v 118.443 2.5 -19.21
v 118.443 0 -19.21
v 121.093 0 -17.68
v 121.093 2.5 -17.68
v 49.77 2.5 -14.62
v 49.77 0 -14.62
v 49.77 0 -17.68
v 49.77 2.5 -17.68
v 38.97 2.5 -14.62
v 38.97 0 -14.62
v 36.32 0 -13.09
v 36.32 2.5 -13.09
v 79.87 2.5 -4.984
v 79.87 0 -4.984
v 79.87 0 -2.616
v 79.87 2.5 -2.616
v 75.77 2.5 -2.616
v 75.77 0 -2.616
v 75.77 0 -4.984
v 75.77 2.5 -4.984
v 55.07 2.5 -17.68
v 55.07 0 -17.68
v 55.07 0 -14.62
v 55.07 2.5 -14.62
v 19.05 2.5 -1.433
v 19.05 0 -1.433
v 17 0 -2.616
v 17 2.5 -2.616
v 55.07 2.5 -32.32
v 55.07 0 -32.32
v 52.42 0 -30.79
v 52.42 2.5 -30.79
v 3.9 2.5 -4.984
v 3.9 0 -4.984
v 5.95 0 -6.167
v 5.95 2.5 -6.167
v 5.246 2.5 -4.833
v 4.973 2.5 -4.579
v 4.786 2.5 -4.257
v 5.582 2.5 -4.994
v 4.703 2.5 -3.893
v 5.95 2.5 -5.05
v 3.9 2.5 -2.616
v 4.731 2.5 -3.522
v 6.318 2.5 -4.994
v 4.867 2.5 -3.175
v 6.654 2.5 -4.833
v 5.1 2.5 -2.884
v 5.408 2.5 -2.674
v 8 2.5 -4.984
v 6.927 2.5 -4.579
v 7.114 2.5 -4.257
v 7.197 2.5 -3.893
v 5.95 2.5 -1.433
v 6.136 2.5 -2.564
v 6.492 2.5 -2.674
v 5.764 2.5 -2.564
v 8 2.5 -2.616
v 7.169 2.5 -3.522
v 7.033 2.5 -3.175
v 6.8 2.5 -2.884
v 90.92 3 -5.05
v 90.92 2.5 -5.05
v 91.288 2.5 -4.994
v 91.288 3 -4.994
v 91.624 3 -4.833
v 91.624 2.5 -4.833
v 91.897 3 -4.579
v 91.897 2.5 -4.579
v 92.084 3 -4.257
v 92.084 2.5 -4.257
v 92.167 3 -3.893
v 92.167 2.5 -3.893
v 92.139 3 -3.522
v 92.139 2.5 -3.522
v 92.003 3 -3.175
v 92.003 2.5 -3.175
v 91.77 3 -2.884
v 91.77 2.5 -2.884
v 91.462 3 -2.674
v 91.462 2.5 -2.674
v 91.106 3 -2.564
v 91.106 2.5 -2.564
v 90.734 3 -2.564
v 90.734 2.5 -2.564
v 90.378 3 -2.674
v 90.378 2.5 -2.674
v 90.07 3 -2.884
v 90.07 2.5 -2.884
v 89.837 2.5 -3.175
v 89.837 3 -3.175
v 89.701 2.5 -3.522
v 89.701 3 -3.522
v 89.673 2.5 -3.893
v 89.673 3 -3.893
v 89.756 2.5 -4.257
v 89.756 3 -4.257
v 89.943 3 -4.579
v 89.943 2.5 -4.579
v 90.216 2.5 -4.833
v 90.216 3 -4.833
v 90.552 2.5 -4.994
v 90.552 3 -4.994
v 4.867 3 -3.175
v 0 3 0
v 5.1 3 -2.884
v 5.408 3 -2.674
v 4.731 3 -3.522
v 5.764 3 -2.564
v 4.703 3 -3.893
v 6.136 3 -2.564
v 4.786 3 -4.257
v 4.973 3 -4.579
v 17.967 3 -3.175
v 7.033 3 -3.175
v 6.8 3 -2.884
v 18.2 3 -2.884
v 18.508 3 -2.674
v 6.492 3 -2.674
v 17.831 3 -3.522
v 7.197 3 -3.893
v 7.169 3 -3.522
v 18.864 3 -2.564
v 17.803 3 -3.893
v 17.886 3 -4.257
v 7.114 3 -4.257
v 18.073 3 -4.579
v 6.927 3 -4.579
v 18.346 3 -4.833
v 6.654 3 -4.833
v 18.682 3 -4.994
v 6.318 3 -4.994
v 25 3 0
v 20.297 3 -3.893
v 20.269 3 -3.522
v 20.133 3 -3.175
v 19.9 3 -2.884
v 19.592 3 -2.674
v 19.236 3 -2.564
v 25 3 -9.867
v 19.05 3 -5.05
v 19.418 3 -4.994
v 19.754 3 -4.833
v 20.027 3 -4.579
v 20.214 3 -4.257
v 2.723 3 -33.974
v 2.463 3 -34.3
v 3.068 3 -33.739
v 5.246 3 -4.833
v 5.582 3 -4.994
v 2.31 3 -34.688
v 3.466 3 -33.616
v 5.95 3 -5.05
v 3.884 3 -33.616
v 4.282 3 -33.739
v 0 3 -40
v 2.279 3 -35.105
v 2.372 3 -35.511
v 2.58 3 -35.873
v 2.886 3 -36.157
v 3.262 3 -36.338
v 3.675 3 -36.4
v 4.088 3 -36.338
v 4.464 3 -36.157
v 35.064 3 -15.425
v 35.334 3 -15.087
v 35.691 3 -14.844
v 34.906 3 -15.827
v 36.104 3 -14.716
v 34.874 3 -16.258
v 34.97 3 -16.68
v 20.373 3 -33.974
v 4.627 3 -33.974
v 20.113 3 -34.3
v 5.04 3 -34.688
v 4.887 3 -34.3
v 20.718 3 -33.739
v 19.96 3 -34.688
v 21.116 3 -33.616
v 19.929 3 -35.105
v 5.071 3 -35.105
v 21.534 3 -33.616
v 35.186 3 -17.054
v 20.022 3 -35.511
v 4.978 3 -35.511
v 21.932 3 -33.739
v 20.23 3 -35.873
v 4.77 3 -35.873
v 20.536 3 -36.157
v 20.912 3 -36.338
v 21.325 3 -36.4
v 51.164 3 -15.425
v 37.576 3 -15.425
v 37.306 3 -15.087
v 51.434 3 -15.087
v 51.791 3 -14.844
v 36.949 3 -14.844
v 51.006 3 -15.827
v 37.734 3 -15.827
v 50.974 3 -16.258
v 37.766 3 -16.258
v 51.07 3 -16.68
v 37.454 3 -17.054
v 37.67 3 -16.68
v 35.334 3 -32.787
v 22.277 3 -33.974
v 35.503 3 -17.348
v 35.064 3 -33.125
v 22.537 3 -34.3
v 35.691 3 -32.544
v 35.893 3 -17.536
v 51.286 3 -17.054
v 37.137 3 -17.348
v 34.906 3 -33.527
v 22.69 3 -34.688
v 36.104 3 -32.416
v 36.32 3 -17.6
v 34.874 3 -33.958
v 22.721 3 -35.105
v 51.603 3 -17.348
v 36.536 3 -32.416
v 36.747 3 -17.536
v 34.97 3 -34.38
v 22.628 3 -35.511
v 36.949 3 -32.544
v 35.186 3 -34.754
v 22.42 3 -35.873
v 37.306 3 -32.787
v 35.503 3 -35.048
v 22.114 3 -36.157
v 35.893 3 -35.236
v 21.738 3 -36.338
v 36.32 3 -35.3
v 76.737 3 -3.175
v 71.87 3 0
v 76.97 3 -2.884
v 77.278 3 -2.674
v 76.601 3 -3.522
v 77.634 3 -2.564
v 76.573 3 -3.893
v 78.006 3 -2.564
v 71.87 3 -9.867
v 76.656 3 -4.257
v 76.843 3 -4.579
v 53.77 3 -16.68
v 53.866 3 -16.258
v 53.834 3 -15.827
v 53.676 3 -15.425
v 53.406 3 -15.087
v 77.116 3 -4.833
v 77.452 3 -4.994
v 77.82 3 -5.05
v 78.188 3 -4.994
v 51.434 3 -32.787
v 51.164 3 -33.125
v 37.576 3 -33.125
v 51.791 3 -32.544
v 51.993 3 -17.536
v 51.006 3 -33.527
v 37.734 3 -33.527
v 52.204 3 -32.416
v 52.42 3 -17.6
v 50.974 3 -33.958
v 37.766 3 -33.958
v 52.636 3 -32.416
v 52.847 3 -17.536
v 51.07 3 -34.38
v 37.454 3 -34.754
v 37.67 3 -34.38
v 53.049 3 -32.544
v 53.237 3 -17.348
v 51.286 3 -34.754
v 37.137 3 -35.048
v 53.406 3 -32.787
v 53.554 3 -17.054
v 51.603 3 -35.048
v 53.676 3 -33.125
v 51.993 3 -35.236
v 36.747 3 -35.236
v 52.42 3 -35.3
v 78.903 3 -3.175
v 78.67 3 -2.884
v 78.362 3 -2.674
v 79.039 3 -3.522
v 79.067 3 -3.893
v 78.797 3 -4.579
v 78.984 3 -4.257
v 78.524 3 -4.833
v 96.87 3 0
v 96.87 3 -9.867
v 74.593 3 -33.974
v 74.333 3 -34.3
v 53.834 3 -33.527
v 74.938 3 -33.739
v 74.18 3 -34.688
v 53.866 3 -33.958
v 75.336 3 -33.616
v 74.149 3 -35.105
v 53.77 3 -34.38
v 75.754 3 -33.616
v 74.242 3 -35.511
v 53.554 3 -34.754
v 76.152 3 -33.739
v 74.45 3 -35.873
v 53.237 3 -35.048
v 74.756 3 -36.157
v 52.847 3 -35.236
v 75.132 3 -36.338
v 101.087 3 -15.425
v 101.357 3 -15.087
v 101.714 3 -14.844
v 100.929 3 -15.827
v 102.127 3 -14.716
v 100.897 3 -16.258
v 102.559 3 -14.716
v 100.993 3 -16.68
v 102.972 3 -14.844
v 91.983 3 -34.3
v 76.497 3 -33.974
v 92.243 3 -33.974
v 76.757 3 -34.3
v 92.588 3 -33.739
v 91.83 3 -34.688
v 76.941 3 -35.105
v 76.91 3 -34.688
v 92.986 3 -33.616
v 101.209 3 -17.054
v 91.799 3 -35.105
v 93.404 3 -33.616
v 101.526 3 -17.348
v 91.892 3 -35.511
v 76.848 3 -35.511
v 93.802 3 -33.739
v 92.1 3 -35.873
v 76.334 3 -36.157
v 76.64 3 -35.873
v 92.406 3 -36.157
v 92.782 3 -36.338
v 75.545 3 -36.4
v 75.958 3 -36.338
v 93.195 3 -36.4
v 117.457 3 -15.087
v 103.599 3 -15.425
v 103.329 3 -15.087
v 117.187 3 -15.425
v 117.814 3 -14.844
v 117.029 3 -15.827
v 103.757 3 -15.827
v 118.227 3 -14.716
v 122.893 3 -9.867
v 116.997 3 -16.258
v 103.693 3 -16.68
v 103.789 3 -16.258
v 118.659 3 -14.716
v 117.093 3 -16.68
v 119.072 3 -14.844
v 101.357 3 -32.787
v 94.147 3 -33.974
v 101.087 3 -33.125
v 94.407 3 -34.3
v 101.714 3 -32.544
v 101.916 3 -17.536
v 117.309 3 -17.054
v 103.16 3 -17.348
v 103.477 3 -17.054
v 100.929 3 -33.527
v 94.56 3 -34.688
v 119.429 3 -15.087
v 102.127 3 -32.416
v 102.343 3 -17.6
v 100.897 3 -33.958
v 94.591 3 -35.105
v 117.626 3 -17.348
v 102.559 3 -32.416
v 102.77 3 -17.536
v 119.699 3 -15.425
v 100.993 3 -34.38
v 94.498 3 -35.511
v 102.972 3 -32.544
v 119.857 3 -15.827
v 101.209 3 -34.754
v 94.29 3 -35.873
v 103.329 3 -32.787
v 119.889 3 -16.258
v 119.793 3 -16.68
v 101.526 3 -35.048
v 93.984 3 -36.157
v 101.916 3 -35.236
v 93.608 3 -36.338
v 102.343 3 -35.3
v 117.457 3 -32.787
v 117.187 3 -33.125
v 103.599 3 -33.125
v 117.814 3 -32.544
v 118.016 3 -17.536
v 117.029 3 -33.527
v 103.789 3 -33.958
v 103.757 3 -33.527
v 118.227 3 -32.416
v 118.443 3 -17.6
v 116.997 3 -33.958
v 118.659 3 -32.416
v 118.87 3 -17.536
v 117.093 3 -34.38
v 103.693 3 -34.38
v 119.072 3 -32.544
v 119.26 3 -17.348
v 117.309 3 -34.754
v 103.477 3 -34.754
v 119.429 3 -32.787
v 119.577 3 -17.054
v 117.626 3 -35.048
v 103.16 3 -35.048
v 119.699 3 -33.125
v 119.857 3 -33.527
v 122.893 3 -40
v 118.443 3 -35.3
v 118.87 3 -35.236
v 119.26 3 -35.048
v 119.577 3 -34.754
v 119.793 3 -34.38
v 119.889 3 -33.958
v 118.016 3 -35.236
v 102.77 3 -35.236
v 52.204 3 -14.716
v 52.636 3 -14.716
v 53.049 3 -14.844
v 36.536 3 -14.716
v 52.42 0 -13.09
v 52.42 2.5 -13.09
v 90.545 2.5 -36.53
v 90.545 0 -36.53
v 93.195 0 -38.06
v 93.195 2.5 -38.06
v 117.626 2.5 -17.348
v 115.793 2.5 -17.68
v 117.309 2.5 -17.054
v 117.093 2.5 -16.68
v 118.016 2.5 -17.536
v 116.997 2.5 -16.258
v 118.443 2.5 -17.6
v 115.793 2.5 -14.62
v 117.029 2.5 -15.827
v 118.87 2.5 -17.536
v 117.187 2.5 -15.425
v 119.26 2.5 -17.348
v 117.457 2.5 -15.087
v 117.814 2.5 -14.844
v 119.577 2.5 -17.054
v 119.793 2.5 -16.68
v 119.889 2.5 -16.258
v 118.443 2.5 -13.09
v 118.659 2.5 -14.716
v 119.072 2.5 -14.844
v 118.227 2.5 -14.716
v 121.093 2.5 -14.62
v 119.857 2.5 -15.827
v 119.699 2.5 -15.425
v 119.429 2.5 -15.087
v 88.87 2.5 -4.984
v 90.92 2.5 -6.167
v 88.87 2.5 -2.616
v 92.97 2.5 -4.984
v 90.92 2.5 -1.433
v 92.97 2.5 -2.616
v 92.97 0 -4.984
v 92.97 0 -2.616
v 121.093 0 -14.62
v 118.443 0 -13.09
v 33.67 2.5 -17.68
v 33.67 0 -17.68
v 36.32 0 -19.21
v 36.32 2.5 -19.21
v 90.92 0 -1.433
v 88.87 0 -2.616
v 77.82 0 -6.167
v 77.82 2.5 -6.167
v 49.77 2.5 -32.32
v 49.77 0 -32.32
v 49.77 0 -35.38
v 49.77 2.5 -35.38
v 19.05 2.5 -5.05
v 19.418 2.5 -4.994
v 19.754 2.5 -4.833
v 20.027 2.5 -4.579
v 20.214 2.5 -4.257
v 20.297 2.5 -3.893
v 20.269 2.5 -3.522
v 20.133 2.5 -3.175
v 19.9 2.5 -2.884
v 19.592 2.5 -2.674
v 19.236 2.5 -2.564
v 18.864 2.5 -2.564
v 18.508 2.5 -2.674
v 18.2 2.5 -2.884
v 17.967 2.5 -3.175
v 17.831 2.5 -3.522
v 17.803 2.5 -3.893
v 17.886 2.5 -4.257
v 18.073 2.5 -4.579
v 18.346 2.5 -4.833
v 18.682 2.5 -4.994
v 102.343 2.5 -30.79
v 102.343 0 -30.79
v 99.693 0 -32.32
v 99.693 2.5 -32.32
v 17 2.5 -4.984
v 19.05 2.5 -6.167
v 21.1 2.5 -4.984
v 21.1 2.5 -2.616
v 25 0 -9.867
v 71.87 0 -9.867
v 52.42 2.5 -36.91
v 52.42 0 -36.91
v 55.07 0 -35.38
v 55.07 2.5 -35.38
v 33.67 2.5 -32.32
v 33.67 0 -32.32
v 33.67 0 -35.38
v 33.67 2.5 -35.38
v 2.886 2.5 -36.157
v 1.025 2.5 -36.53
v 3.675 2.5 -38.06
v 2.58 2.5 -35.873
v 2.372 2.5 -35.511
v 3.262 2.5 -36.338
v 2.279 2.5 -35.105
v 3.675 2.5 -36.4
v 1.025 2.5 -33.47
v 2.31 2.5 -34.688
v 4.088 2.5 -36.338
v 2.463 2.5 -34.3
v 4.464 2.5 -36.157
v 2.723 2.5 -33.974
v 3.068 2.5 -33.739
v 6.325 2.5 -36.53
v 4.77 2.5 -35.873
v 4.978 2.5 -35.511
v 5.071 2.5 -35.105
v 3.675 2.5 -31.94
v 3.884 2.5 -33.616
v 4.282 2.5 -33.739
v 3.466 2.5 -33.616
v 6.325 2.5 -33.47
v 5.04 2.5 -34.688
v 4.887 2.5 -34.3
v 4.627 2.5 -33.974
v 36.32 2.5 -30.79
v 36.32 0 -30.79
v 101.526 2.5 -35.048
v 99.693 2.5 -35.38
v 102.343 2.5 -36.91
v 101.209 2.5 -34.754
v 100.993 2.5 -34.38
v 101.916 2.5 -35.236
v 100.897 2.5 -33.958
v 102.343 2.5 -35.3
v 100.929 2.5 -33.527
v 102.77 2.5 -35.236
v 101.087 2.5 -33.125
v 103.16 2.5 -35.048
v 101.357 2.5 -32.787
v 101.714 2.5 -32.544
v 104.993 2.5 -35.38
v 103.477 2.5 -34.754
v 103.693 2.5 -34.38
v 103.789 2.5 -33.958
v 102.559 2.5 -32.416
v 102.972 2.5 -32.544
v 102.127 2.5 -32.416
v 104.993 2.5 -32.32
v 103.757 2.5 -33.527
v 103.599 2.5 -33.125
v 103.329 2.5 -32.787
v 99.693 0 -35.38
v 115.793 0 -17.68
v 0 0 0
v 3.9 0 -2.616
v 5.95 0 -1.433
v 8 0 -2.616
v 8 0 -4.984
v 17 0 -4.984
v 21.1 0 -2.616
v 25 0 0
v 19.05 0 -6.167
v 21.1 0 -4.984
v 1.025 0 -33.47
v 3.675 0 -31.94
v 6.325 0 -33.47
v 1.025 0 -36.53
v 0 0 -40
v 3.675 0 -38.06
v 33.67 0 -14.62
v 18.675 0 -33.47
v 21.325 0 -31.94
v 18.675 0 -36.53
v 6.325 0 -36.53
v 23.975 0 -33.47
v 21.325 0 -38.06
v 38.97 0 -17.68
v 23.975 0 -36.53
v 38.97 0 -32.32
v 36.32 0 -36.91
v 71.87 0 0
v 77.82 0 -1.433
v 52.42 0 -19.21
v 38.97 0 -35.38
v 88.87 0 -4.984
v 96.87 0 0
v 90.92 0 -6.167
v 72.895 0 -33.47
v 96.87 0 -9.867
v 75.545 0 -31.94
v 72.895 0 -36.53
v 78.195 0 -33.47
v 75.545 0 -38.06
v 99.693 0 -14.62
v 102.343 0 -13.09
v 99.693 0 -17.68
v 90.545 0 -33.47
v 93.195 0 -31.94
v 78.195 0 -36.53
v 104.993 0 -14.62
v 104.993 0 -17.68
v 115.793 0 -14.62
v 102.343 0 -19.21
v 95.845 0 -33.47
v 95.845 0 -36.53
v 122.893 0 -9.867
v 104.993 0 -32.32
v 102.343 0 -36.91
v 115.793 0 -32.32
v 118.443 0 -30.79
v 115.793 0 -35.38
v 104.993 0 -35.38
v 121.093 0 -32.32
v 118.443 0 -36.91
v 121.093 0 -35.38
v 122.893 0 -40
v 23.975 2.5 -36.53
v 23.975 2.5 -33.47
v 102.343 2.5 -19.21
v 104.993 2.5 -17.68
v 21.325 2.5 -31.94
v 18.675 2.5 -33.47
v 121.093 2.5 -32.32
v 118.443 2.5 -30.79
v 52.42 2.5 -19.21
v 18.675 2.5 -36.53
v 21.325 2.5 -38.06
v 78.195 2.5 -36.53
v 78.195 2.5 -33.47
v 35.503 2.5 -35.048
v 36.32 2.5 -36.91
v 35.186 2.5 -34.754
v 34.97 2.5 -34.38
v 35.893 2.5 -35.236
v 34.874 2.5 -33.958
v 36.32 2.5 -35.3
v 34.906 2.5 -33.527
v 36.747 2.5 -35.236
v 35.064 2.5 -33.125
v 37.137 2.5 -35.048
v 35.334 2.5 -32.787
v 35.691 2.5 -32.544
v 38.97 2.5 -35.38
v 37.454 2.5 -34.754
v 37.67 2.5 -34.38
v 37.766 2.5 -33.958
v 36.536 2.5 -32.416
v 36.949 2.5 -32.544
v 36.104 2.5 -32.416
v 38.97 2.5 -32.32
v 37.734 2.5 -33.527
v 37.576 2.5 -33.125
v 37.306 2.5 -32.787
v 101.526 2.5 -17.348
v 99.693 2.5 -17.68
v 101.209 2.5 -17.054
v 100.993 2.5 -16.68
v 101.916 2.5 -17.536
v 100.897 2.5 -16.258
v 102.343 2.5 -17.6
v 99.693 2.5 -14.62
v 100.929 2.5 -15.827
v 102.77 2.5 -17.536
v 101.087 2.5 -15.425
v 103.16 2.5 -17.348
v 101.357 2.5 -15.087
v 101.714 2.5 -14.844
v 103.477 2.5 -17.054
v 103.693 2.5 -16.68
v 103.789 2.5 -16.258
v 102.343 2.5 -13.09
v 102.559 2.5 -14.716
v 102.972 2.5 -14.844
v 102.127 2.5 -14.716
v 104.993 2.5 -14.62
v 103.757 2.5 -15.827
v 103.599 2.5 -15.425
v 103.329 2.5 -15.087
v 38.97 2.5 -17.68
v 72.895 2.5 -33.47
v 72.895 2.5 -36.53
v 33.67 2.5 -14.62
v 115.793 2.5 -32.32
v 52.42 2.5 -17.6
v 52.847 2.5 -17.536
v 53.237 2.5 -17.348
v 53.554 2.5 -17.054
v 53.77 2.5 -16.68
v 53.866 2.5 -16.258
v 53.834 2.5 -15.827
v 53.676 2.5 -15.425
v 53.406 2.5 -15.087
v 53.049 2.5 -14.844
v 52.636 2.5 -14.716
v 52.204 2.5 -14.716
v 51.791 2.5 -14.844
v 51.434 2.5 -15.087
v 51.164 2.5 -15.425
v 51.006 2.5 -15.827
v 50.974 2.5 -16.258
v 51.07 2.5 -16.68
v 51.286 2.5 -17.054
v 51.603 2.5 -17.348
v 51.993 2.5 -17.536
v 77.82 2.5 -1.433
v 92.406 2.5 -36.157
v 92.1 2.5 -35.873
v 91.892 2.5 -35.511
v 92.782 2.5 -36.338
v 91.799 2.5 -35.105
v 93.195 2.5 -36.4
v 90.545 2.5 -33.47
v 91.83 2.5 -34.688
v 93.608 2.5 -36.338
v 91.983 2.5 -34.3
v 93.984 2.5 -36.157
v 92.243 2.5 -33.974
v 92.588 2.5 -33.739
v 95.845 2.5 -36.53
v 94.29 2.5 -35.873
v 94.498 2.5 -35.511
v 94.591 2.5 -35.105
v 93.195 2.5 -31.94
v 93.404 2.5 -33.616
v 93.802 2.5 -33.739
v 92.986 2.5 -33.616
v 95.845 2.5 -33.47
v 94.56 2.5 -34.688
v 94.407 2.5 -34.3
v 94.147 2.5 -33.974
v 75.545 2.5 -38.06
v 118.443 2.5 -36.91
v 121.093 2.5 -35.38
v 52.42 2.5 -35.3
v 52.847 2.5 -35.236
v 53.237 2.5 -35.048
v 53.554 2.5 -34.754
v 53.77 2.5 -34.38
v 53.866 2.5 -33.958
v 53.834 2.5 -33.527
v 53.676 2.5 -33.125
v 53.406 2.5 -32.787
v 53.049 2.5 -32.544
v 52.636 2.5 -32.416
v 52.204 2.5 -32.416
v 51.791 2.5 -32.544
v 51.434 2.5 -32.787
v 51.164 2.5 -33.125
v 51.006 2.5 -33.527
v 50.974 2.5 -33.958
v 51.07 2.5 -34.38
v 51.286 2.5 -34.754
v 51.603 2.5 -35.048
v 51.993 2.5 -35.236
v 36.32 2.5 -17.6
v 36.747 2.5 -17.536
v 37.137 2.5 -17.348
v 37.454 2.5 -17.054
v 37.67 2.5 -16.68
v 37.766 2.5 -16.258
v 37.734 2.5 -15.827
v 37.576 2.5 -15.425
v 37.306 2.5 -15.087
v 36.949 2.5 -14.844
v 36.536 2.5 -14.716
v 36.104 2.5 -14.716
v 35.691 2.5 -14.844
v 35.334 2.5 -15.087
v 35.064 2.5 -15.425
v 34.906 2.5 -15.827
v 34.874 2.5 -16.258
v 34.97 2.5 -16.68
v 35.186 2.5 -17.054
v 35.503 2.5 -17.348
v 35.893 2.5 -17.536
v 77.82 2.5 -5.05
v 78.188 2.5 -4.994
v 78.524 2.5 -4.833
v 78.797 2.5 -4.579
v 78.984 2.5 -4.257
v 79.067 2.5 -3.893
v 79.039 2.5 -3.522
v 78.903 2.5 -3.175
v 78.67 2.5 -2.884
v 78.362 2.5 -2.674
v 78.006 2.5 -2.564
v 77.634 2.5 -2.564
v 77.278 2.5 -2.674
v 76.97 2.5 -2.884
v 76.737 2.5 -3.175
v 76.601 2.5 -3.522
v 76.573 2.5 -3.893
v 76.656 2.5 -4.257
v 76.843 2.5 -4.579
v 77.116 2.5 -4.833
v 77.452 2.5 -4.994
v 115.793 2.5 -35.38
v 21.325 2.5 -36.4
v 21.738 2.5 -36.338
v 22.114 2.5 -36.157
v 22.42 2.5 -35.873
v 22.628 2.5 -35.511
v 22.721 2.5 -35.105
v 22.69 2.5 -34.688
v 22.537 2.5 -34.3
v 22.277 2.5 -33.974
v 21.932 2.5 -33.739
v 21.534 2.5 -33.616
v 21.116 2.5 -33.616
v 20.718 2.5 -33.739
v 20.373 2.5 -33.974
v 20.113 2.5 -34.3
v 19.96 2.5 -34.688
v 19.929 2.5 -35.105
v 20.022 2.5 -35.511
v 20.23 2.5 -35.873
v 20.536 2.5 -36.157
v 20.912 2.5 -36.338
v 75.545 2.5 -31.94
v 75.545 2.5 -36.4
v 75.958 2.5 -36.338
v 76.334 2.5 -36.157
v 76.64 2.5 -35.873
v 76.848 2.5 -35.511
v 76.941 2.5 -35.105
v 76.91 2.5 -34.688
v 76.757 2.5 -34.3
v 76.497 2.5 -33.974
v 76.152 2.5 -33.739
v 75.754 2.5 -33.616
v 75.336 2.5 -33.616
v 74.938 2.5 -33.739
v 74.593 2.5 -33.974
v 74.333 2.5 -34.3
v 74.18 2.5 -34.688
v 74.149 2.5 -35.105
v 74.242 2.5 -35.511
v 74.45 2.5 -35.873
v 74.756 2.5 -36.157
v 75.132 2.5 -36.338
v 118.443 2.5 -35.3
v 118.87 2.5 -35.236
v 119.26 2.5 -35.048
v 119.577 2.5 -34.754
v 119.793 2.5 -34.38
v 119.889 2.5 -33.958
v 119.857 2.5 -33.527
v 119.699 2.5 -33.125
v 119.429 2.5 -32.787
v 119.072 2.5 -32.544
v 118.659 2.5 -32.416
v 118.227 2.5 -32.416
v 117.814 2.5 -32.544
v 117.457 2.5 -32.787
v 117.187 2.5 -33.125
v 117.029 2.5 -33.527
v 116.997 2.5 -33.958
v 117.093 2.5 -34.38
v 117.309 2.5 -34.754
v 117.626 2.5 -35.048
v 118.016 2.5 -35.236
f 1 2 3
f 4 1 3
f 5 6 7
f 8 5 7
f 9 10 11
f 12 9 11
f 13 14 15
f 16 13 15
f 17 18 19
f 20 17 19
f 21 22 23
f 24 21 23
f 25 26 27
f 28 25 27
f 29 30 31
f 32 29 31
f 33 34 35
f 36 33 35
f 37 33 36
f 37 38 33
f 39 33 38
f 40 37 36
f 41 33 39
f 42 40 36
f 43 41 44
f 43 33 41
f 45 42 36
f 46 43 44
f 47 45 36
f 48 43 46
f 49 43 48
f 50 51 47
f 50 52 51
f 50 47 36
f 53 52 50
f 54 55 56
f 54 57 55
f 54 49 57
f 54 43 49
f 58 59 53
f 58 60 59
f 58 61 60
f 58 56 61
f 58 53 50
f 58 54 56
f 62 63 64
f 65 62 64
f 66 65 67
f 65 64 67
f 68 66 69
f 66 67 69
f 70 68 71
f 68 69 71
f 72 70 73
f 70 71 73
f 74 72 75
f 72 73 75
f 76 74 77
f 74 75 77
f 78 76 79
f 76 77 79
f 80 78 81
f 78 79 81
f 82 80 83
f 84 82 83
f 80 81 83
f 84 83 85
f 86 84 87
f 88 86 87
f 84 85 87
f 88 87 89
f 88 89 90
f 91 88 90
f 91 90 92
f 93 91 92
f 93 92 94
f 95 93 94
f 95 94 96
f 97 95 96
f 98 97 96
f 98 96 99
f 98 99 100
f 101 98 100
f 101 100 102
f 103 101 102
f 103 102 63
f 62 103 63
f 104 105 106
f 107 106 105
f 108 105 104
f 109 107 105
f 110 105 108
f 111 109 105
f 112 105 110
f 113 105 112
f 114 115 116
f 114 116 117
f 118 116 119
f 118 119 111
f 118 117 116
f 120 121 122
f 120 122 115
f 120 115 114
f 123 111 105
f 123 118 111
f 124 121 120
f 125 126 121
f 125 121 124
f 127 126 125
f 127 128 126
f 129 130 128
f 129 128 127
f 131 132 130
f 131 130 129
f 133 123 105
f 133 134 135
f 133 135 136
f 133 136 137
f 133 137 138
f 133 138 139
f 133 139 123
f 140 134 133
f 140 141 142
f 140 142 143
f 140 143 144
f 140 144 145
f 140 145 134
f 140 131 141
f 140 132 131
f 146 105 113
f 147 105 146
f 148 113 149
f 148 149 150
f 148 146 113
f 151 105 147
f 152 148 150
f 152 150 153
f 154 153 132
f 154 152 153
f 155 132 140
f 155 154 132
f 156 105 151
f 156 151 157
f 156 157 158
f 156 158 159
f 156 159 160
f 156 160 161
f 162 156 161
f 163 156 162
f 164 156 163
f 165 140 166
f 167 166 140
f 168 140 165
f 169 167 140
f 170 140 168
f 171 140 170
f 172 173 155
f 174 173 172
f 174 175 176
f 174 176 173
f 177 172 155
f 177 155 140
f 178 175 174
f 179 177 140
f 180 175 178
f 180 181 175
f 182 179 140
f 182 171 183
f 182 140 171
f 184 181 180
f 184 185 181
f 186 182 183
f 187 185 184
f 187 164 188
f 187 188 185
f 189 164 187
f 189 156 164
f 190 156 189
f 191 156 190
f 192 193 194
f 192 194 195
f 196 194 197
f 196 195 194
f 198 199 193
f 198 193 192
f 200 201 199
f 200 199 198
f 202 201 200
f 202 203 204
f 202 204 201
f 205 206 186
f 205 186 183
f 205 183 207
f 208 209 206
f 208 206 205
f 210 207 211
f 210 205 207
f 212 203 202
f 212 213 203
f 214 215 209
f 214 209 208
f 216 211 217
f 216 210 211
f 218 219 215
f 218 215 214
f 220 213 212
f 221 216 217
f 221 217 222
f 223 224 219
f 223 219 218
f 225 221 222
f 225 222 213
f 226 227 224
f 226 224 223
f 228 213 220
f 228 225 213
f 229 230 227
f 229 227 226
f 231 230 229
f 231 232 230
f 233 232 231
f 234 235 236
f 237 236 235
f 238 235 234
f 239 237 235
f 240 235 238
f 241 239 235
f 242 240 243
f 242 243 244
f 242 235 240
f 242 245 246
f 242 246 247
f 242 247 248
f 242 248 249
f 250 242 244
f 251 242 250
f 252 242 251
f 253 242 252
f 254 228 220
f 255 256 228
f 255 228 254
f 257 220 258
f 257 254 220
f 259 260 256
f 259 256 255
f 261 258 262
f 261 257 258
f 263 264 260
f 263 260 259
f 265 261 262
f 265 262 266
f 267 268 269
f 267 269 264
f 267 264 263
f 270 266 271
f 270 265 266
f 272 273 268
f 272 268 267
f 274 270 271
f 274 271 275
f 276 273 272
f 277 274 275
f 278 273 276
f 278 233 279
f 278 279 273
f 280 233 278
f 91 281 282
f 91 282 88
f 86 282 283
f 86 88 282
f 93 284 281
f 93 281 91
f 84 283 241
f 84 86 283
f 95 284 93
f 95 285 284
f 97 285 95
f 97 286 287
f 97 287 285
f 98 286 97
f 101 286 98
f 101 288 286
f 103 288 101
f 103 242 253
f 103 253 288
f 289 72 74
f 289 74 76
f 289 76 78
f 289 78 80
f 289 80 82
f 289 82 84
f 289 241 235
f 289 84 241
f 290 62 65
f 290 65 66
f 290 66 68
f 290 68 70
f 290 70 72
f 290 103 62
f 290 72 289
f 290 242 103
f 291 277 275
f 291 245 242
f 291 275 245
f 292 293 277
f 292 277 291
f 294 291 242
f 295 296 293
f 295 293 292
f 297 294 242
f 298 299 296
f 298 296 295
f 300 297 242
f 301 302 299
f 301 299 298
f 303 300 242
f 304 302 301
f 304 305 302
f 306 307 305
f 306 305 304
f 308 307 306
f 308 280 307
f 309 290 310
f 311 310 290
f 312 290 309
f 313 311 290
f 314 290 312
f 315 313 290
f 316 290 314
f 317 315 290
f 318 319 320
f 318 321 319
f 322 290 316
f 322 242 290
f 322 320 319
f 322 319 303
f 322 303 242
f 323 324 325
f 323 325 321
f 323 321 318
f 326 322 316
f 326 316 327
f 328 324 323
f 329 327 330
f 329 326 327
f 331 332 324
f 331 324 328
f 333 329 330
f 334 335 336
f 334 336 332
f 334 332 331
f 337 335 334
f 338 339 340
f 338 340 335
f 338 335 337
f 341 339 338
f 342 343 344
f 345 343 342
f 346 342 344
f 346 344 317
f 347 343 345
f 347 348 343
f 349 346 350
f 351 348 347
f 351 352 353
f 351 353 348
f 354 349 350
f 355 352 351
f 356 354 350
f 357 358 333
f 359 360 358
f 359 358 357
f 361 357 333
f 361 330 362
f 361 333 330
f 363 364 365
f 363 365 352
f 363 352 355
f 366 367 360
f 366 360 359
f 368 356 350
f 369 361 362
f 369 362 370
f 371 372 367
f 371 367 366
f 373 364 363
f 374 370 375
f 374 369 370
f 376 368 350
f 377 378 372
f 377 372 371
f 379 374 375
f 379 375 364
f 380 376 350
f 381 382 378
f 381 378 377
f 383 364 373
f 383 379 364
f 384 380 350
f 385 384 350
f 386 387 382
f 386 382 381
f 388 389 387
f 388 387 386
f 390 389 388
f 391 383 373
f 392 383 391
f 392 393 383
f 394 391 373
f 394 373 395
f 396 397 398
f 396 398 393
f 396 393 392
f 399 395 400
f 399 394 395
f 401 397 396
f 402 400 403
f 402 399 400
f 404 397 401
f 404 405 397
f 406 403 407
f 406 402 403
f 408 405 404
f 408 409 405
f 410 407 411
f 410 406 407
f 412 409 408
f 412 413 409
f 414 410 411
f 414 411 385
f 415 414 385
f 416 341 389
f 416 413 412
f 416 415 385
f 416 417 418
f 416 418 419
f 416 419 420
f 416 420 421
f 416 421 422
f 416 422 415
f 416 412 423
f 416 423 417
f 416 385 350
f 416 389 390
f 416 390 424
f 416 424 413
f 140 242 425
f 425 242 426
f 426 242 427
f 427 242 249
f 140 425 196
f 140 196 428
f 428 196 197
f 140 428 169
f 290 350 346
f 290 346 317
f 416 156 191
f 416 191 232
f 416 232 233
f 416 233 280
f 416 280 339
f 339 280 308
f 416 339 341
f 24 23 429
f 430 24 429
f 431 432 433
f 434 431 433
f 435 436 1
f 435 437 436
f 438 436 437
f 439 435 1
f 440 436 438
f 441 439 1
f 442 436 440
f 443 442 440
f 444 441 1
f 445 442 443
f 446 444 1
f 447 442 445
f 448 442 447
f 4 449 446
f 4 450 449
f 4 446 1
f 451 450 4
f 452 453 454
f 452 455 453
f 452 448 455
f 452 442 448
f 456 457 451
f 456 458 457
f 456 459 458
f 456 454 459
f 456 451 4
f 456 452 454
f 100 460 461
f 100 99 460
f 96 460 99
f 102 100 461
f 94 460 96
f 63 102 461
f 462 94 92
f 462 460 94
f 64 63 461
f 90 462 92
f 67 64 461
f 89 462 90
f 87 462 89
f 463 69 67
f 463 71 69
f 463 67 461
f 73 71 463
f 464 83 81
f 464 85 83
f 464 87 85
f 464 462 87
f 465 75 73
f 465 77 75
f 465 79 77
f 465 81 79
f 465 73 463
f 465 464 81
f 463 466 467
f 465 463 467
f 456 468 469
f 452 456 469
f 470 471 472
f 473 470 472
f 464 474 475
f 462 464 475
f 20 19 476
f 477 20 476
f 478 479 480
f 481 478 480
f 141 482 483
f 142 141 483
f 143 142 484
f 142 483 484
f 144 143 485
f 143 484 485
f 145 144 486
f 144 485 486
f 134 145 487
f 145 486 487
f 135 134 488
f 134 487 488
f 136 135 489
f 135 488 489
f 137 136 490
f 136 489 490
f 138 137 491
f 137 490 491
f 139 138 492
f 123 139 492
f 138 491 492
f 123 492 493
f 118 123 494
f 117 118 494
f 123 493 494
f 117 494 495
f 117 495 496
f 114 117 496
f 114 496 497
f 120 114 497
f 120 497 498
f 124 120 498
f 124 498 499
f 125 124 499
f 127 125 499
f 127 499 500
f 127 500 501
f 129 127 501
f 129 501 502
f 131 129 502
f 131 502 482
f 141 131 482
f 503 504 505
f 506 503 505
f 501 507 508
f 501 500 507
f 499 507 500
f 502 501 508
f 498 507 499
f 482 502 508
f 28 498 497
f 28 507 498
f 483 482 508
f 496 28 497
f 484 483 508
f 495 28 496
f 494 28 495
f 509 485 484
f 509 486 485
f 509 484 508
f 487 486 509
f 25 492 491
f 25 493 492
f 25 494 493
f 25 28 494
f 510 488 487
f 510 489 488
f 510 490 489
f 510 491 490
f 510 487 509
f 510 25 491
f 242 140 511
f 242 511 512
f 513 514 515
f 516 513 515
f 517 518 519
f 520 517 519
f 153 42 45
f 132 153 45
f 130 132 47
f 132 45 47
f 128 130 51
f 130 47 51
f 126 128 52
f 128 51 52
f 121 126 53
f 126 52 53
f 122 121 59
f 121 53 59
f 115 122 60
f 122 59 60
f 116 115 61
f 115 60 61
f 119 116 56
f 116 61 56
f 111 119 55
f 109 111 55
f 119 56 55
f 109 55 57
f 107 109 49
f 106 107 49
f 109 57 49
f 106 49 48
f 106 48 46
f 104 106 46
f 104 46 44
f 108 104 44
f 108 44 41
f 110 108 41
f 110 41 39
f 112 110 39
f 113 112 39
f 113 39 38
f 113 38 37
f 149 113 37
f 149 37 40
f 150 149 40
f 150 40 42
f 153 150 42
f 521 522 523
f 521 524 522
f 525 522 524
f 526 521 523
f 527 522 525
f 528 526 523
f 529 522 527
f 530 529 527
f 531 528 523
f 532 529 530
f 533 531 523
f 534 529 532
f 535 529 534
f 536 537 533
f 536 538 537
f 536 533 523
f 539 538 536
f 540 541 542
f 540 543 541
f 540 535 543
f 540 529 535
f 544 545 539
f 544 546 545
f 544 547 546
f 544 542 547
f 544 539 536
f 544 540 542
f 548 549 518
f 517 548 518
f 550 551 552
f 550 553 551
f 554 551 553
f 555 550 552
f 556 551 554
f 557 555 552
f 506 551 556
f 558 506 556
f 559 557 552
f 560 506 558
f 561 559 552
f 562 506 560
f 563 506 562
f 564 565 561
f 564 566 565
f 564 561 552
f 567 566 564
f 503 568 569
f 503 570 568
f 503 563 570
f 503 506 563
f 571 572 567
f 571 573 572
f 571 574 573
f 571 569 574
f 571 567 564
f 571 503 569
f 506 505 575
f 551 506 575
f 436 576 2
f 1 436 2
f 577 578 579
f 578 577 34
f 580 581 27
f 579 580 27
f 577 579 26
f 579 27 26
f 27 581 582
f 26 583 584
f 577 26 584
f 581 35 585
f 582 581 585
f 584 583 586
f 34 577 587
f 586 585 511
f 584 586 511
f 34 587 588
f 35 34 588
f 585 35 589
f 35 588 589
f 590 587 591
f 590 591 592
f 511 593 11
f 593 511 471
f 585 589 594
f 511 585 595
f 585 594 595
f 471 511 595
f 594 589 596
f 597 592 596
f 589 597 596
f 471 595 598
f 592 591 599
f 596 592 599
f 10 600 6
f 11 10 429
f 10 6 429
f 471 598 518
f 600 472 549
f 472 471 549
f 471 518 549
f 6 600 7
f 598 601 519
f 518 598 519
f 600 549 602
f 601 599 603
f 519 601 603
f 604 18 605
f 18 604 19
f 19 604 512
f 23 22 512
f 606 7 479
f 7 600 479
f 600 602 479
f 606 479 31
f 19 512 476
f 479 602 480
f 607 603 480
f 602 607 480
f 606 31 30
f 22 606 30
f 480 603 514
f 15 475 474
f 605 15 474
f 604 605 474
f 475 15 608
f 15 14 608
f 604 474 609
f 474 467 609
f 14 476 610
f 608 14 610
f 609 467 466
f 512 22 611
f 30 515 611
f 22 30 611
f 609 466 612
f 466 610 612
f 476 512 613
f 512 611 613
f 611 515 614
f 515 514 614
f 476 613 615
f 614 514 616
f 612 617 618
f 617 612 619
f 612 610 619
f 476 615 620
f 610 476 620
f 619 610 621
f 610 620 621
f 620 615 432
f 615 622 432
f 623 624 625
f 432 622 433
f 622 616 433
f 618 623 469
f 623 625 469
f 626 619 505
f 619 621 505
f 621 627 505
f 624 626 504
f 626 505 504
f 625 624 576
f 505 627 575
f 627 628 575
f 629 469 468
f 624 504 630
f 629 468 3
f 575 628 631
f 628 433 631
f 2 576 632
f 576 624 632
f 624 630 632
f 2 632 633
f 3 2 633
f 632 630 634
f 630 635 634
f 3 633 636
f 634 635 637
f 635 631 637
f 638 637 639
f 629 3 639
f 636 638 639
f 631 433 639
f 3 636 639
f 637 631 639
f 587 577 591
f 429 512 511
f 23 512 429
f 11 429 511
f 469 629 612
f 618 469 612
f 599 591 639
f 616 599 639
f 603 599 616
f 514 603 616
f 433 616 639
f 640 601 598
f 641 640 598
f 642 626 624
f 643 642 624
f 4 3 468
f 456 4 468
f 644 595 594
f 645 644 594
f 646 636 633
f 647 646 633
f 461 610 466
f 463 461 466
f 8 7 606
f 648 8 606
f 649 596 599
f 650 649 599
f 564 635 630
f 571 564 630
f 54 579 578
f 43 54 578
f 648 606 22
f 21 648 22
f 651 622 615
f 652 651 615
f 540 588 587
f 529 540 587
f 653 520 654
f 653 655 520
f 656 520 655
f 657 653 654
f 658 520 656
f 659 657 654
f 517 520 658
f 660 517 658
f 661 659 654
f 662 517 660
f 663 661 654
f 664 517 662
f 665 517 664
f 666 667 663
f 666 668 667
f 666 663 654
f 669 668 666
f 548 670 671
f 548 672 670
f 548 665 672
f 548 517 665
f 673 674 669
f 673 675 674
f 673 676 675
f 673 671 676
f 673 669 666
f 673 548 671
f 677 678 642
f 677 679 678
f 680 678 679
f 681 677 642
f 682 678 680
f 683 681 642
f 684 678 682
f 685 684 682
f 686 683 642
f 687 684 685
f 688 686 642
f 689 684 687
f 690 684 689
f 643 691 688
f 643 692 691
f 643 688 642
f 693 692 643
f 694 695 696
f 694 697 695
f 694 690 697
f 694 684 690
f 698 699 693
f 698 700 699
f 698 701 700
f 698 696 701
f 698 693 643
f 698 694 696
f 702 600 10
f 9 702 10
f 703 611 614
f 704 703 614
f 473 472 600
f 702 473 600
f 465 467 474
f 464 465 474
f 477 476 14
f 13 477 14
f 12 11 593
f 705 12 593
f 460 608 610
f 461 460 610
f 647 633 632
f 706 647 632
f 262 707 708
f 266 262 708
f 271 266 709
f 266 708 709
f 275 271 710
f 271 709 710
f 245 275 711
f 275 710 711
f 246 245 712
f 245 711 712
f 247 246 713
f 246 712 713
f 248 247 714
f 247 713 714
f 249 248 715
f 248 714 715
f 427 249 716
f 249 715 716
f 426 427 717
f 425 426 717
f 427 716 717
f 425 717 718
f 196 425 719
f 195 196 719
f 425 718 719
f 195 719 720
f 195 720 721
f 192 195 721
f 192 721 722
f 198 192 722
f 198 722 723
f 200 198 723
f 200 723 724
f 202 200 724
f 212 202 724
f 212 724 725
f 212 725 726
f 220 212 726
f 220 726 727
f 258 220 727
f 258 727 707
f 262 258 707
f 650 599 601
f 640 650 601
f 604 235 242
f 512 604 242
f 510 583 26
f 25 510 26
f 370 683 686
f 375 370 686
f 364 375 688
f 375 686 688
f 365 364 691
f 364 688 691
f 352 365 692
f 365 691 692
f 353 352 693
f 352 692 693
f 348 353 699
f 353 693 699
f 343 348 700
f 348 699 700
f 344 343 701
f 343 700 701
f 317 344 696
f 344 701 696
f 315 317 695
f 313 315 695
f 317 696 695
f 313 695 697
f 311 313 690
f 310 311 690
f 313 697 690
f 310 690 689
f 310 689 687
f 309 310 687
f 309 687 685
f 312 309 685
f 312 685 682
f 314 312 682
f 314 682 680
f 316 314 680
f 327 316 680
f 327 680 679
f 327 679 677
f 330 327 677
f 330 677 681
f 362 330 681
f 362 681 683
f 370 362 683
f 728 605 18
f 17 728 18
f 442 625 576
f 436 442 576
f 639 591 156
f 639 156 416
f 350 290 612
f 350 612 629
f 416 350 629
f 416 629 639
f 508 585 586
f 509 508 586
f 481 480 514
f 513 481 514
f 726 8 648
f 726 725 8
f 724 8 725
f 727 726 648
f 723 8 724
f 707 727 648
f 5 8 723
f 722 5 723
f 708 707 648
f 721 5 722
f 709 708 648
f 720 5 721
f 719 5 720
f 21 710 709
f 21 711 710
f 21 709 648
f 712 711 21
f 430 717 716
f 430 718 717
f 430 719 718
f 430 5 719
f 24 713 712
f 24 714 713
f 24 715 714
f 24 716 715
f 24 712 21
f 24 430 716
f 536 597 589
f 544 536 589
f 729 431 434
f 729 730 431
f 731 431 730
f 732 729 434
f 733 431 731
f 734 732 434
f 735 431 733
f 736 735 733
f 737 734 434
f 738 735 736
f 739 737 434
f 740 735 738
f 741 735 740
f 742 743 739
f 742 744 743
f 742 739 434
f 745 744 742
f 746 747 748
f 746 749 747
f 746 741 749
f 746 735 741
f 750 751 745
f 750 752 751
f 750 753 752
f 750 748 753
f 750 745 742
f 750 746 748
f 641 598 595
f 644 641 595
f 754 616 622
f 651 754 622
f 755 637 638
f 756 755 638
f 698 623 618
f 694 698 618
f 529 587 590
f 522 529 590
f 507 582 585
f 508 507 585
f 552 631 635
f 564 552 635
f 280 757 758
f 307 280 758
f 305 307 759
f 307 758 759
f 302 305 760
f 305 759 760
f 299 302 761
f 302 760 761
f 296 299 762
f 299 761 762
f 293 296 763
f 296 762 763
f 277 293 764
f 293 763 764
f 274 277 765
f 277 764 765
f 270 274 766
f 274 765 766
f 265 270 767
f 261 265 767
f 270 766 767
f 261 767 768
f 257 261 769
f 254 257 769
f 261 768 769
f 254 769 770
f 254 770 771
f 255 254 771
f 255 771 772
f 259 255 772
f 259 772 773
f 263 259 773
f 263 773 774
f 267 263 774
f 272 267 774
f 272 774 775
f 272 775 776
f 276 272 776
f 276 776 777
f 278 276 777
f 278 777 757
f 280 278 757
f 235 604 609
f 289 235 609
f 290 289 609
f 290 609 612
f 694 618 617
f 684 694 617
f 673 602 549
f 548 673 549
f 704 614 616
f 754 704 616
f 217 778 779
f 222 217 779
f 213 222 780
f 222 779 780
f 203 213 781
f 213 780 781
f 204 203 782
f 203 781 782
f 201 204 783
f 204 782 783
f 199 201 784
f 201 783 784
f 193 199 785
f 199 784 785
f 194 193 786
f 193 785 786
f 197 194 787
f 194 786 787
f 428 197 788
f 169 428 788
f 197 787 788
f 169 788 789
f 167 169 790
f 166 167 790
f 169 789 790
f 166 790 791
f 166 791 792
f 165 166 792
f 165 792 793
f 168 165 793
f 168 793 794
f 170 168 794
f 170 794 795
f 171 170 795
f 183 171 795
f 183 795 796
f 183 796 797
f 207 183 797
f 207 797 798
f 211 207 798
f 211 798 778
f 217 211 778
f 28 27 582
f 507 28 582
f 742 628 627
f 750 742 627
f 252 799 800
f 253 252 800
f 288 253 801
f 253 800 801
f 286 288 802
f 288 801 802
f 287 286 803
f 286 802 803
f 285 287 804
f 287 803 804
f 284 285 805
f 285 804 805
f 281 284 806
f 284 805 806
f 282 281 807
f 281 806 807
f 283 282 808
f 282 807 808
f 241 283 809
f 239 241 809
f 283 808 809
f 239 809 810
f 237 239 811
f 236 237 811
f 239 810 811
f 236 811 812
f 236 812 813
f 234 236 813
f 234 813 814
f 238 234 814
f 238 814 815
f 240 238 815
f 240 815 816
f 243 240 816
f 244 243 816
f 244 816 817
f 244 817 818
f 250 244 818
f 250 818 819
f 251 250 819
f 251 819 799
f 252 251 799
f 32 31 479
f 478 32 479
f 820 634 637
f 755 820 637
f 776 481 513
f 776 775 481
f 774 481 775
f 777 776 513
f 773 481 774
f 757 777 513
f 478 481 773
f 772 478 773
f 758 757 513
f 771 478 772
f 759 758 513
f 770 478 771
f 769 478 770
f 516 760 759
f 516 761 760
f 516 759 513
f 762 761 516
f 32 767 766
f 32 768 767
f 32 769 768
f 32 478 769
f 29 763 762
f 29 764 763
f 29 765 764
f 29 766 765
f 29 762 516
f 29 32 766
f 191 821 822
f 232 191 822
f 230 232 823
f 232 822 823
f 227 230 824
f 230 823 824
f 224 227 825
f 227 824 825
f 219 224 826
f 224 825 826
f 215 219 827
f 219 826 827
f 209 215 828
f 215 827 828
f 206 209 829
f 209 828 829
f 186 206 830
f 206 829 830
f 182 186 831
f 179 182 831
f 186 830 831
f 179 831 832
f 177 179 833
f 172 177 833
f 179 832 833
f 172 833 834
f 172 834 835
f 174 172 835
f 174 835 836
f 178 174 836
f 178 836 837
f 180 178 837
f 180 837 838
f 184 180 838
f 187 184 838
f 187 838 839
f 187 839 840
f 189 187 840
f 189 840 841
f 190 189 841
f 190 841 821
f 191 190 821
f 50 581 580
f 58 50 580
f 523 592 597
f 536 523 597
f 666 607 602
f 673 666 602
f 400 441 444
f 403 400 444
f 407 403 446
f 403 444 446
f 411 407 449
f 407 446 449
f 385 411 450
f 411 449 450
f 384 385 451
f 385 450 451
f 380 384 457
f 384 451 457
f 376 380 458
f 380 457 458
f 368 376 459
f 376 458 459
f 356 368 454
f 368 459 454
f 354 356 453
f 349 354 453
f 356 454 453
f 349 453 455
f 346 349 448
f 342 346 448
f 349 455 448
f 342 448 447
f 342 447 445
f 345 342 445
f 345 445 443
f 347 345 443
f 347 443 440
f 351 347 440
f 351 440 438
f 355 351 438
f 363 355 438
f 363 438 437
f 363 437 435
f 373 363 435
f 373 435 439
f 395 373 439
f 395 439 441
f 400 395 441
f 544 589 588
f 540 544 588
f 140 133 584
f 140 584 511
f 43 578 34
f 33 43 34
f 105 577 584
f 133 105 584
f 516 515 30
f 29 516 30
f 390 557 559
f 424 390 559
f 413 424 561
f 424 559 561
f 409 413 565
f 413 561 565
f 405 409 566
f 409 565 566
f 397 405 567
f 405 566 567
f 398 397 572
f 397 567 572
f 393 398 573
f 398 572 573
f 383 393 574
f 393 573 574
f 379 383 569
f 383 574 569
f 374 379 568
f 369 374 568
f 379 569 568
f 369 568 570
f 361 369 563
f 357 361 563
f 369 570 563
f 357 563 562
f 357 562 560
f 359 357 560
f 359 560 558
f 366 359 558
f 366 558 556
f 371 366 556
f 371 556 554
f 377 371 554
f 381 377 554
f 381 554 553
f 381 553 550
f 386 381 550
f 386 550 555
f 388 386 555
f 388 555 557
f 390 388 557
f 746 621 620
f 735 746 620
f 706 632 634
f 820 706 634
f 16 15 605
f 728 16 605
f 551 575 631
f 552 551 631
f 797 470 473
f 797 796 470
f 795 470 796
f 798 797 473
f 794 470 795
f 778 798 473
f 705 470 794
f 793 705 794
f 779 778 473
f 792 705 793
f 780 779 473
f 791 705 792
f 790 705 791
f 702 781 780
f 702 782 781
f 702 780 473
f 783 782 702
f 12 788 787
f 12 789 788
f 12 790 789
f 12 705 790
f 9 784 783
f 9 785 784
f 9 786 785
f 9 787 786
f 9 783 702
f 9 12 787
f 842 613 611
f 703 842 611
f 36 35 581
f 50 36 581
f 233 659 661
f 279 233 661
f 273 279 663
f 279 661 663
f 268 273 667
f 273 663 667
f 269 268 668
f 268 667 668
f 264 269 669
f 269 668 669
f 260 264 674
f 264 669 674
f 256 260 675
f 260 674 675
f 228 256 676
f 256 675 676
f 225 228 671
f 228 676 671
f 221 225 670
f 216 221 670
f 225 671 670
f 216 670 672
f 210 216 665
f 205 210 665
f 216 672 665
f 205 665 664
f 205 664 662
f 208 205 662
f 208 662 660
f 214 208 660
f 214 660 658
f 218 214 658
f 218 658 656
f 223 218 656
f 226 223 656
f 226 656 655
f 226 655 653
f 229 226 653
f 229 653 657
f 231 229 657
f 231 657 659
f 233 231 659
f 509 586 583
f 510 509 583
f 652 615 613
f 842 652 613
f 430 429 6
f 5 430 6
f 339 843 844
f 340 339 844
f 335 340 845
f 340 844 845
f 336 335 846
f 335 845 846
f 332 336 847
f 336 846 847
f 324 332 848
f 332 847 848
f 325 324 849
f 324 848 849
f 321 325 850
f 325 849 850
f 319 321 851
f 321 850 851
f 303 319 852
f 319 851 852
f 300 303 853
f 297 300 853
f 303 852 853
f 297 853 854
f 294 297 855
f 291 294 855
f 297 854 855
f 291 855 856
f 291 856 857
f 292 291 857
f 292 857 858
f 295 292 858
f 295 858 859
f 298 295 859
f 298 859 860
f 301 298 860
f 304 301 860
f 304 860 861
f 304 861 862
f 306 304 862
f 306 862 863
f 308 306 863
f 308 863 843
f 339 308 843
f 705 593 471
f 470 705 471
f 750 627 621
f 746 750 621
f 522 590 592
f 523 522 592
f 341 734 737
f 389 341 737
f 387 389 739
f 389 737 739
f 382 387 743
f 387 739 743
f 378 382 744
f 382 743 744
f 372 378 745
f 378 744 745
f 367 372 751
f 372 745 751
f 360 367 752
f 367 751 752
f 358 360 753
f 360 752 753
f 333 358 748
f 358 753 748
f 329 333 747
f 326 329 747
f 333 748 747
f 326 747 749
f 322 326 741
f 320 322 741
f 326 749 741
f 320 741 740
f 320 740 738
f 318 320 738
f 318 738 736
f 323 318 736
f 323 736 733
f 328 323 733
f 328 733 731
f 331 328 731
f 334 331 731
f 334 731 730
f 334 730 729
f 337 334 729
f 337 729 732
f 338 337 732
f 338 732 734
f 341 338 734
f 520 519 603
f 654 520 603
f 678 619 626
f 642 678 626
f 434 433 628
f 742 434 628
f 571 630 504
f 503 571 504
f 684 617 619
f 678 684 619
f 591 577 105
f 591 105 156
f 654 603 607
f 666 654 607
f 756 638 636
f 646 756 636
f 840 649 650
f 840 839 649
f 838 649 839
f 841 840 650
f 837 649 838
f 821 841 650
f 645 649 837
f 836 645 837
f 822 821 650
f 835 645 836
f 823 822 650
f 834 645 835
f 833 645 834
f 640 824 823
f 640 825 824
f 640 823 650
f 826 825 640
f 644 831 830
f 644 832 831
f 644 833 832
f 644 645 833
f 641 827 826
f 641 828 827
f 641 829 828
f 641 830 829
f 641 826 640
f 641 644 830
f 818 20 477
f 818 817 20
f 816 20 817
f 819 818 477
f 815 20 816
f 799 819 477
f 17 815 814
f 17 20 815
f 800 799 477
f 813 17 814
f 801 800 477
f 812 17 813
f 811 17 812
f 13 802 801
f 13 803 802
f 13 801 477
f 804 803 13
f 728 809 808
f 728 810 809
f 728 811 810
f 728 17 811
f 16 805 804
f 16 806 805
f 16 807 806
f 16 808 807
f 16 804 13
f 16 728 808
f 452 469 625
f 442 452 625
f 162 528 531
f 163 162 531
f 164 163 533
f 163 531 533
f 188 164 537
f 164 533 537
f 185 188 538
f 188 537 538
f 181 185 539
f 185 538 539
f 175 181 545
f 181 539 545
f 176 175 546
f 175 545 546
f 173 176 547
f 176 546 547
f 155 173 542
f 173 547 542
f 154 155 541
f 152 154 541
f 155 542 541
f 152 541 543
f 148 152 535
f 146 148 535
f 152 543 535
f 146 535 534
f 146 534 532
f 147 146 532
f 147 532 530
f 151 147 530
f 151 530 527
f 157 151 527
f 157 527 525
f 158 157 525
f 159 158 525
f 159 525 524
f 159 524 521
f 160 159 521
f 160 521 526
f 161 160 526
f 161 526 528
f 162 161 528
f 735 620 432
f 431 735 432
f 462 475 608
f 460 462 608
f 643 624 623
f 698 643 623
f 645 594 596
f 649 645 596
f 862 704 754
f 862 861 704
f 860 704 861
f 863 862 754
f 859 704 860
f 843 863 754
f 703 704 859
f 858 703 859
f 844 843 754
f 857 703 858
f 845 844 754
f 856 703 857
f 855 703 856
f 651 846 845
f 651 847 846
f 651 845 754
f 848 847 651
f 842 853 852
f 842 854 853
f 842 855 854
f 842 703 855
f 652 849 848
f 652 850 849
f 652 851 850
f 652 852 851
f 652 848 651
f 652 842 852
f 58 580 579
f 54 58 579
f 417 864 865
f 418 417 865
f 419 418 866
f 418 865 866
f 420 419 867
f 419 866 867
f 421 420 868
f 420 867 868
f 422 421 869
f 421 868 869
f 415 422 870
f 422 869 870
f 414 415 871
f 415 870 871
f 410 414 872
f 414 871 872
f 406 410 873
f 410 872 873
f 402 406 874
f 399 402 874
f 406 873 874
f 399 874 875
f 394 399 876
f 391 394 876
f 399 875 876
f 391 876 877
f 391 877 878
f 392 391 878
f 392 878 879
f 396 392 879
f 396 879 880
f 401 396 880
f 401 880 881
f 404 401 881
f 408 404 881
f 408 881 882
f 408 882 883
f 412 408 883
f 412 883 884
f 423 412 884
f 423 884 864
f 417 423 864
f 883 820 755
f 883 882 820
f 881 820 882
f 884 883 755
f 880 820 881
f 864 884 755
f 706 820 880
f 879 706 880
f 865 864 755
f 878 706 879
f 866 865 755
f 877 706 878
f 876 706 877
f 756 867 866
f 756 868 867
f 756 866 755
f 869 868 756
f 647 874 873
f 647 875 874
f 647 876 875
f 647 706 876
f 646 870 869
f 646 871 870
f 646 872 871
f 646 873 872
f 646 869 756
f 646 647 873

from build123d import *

# Parameters (mm, degrees)
SKETCH1_W           = 140
SKETCH1_H           = 40
BOSS_EXTRUDE1_DEPTH = 3
SKETCH2_R           = 1.4
SKETCH2_R_2         = 1.25
SKETCH2_R_3         = 1.45
CUT_EXTRUDE1_DEPTH  = 146.633100633
CUT_EXTRUDE2_DEPTH  = 2.5
SKETCH5_W           = 46.87
SKETCH5_H           = 9.866874784
CUT_EXTRUDE4_DEPTH  = 146.633100633


with BuildPart() as part:
    # Sketch1 → Boss-Extrude1 (new body)
    with BuildSketch(Plane(origin=(0, 0, 0), x_dir=(1, 0, 0), z_dir=(0, 1, 0))):
        with Locations((70, 20)):
            Rectangle(SKETCH1_W, SKETCH1_H)
    extrude(amount=BOSS_EXTRUDE1_DEPTH)

    # Sketch2 → Cut-Extrude1 (cut, through all)
    with BuildSketch(Plane.XZ):
        with Locations(Location((3.675, -35, 0), (0, 0, 270))):
            Circle(SKETCH2_R)
        with Locations(Location((21.325, -35, 0), (0, 0, 270))):
            Circle(SKETCH2_R)
        with Locations(Location((5.95, -3.8, 0), (0, 0, 270))):
            Circle(SKETCH2_R_2)
        with Locations(Location((19.05, -3.8, 0), (0, 0, 270))):
            Circle(SKETCH2_R_2)
        with Locations(Location((36.32, -33.85, 0), (0, 0, 270))):
            Circle(SKETCH2_R_3)
        with Locations(Location((52.42, -33.85, 0), (0, 0, 270))):
            Circle(SKETCH2_R_3)
        with Locations(Location((52.42, -16.15, 0), (0, 0, 270))):
            Circle(SKETCH2_R_3)
        with Locations(Location((36.32, -16.15, 0), (0, 0, 270))):
            Circle(SKETCH2_R_3)
        with Locations(Location((75.545, -35, 0), (0, 0, 270))):
            Circle(SKETCH2_R)
        with Locations(Location((93.195, -35, 0), (0, 0, 270))):
            Circle(SKETCH2_R)
        with Locations(Location((77.82, -3.8, 0), (0, 0, 270))):
            Circle(SKETCH2_R_2)
        with Locations(Location((90.92, -3.8, 0), (0, 0, 270))):
            Circle(SKETCH2_R_2)
        with Locations(Location((102.342999781, -33.85, 0), (0, 0, 270))):
            Circle(SKETCH2_R_3)
        with Locations(Location((118.442999781, -33.85, 0), (0, 0, 270))):
            Circle(SKETCH2_R_3)
        with Locations(Location((102.342999781, -16.15, 0), (0, 0, 270))):
            Circle(SKETCH2_R_3)
        with Locations(Location((118.442999781, -16.15, 0), (0, 0, 270))):
            Circle(SKETCH2_R_3)
    extrude(amount=-CUT_EXTRUDE1_DEPTH, mode=Mode.SUBTRACT)

    # Sketch3 → Cut-Extrude2 (cut)
    with BuildSketch(Plane.XZ):
        Polygon((8, -4.983568052), (8, -2.616431948), (5.95, -1.432863896), (3.9, -2.616431948), (3.9, -4.983568052), (5.95, -6.167136104), align=None)
        Polygon((21.1, -4.983568052), (21.1, -2.616431948), (19.05, -1.432863896), (17, -2.616431948), (17, -4.983568052), (19.05, -6.167136104), align=None)
        Polygon((6.325, -36.529978213), (6.325, -33.470021787), (3.675, -31.940043573), (1.025, -33.470021787), (1.025, -36.529978213), (3.675, -38.059956427), align=None)
        Polygon((21.325, -38.059956427), (23.975, -36.529978213), (23.975, -33.470021787), (21.325, -31.940043573), (18.675, -33.470021787), (18.675, -36.529978213), align=None)
        Polygon((38.97, -17.679978213), (38.97, -14.620021787), (36.32, -13.090043573), (33.67, -14.620021787), (33.67, -17.679978213), (36.32, -19.209956427), align=None)
        Polygon((52.42, -19.209956427), (55.07, -17.679978213), (55.07, -14.620021787), (52.42, -13.090043573), (49.77, -14.620021787), (49.77, -17.679978213), align=None)
        Polygon((38.97, -35.379978213), (38.97, -32.320021787), (36.32, -30.790043573), (33.67, -32.320021787), (33.67, -35.379978213), (36.32, -36.909956427), align=None)
        Polygon((55.07, -35.379978213), (55.07, -32.320021787), (52.42, -30.790043573), (49.77, -32.320021787), (49.77, -35.379978213), (52.42, -36.909956427), align=None)
        Polygon((78.195, -33.470021787), (75.545, -31.940043573), (72.895, -33.470021787), (72.895, -36.529978213), (75.545, -38.059956427), (78.195, -36.529978213), align=None)
        Polygon((95.845, -36.529978213), (95.845, -33.470021787), (93.195, -31.940043573), (90.545, -33.470021787), (90.545, -36.529978213), (93.195, -38.059956427), align=None)
        Polygon((90.92, -6.167136104), (92.97, -4.983568052), (92.97, -2.616431948), (90.92, -1.432863896), (88.87, -2.616431948), (88.87, -4.983568052), align=None)
        Polygon((79.87, -4.983568052), (79.87, -2.616431948), (77.82, -1.432863896), (75.77, -2.616431948), (75.77, -4.983568052), (77.82, -6.167136104), align=None)
        Polygon((118.442999781, -30.790043573), (115.792999781, -32.320021787), (115.792999781, -35.379978213), (118.442999781, -36.909956427), (121.092999781, -35.379978213), (121.092999781, -32.320021787), align=None)
        Polygon((102.342999781, -30.790043573), (99.692999781, -32.320021787), (99.692999781, -35.379978213), (102.342999781, -36.909956427), (104.992999781, -35.379978213), (104.992999781, -32.320021787), align=None)
        Polygon((102.342999781, -13.090043573), (99.692999781, -14.620021787), (99.692999781, -17.679978213), (102.342999781, -19.209956427), (104.992999781, -17.679978213), (104.992999781, -14.620021787), align=None)
        Polygon((118.442999781, -13.090043573), (115.792999781, -14.620021787), (115.792999781, -17.679978213), (118.442999781, -19.209956427), (121.092999781, -17.679978213), (121.092999781, -14.620021787), align=None)
    extrude(amount=-CUT_EXTRUDE2_DEPTH, mode=Mode.SUBTRACT)

    # Sketch5 → Cut-Extrude4 (cut, through all)
    with BuildSketch(Plane(origin=(0, 3, 0), x_dir=(1, 0, 0), z_dir=(0, 1, 0))):
        with Locations((48.435, 4.933437392)):
            Rectangle(SKETCH5_W, SKETCH5_H)
        Polygon((96.87, 9.866874784), (122.892999781, 9.866874784), (122.892999781, 40), (140, 40), (140, 9.866874784), (140, 0), (96.87, 0), align=None)
    extrude(amount=-CUT_EXTRUDE4_DEPTH, mode=Mode.SUBTRACT)


solid = part.part
